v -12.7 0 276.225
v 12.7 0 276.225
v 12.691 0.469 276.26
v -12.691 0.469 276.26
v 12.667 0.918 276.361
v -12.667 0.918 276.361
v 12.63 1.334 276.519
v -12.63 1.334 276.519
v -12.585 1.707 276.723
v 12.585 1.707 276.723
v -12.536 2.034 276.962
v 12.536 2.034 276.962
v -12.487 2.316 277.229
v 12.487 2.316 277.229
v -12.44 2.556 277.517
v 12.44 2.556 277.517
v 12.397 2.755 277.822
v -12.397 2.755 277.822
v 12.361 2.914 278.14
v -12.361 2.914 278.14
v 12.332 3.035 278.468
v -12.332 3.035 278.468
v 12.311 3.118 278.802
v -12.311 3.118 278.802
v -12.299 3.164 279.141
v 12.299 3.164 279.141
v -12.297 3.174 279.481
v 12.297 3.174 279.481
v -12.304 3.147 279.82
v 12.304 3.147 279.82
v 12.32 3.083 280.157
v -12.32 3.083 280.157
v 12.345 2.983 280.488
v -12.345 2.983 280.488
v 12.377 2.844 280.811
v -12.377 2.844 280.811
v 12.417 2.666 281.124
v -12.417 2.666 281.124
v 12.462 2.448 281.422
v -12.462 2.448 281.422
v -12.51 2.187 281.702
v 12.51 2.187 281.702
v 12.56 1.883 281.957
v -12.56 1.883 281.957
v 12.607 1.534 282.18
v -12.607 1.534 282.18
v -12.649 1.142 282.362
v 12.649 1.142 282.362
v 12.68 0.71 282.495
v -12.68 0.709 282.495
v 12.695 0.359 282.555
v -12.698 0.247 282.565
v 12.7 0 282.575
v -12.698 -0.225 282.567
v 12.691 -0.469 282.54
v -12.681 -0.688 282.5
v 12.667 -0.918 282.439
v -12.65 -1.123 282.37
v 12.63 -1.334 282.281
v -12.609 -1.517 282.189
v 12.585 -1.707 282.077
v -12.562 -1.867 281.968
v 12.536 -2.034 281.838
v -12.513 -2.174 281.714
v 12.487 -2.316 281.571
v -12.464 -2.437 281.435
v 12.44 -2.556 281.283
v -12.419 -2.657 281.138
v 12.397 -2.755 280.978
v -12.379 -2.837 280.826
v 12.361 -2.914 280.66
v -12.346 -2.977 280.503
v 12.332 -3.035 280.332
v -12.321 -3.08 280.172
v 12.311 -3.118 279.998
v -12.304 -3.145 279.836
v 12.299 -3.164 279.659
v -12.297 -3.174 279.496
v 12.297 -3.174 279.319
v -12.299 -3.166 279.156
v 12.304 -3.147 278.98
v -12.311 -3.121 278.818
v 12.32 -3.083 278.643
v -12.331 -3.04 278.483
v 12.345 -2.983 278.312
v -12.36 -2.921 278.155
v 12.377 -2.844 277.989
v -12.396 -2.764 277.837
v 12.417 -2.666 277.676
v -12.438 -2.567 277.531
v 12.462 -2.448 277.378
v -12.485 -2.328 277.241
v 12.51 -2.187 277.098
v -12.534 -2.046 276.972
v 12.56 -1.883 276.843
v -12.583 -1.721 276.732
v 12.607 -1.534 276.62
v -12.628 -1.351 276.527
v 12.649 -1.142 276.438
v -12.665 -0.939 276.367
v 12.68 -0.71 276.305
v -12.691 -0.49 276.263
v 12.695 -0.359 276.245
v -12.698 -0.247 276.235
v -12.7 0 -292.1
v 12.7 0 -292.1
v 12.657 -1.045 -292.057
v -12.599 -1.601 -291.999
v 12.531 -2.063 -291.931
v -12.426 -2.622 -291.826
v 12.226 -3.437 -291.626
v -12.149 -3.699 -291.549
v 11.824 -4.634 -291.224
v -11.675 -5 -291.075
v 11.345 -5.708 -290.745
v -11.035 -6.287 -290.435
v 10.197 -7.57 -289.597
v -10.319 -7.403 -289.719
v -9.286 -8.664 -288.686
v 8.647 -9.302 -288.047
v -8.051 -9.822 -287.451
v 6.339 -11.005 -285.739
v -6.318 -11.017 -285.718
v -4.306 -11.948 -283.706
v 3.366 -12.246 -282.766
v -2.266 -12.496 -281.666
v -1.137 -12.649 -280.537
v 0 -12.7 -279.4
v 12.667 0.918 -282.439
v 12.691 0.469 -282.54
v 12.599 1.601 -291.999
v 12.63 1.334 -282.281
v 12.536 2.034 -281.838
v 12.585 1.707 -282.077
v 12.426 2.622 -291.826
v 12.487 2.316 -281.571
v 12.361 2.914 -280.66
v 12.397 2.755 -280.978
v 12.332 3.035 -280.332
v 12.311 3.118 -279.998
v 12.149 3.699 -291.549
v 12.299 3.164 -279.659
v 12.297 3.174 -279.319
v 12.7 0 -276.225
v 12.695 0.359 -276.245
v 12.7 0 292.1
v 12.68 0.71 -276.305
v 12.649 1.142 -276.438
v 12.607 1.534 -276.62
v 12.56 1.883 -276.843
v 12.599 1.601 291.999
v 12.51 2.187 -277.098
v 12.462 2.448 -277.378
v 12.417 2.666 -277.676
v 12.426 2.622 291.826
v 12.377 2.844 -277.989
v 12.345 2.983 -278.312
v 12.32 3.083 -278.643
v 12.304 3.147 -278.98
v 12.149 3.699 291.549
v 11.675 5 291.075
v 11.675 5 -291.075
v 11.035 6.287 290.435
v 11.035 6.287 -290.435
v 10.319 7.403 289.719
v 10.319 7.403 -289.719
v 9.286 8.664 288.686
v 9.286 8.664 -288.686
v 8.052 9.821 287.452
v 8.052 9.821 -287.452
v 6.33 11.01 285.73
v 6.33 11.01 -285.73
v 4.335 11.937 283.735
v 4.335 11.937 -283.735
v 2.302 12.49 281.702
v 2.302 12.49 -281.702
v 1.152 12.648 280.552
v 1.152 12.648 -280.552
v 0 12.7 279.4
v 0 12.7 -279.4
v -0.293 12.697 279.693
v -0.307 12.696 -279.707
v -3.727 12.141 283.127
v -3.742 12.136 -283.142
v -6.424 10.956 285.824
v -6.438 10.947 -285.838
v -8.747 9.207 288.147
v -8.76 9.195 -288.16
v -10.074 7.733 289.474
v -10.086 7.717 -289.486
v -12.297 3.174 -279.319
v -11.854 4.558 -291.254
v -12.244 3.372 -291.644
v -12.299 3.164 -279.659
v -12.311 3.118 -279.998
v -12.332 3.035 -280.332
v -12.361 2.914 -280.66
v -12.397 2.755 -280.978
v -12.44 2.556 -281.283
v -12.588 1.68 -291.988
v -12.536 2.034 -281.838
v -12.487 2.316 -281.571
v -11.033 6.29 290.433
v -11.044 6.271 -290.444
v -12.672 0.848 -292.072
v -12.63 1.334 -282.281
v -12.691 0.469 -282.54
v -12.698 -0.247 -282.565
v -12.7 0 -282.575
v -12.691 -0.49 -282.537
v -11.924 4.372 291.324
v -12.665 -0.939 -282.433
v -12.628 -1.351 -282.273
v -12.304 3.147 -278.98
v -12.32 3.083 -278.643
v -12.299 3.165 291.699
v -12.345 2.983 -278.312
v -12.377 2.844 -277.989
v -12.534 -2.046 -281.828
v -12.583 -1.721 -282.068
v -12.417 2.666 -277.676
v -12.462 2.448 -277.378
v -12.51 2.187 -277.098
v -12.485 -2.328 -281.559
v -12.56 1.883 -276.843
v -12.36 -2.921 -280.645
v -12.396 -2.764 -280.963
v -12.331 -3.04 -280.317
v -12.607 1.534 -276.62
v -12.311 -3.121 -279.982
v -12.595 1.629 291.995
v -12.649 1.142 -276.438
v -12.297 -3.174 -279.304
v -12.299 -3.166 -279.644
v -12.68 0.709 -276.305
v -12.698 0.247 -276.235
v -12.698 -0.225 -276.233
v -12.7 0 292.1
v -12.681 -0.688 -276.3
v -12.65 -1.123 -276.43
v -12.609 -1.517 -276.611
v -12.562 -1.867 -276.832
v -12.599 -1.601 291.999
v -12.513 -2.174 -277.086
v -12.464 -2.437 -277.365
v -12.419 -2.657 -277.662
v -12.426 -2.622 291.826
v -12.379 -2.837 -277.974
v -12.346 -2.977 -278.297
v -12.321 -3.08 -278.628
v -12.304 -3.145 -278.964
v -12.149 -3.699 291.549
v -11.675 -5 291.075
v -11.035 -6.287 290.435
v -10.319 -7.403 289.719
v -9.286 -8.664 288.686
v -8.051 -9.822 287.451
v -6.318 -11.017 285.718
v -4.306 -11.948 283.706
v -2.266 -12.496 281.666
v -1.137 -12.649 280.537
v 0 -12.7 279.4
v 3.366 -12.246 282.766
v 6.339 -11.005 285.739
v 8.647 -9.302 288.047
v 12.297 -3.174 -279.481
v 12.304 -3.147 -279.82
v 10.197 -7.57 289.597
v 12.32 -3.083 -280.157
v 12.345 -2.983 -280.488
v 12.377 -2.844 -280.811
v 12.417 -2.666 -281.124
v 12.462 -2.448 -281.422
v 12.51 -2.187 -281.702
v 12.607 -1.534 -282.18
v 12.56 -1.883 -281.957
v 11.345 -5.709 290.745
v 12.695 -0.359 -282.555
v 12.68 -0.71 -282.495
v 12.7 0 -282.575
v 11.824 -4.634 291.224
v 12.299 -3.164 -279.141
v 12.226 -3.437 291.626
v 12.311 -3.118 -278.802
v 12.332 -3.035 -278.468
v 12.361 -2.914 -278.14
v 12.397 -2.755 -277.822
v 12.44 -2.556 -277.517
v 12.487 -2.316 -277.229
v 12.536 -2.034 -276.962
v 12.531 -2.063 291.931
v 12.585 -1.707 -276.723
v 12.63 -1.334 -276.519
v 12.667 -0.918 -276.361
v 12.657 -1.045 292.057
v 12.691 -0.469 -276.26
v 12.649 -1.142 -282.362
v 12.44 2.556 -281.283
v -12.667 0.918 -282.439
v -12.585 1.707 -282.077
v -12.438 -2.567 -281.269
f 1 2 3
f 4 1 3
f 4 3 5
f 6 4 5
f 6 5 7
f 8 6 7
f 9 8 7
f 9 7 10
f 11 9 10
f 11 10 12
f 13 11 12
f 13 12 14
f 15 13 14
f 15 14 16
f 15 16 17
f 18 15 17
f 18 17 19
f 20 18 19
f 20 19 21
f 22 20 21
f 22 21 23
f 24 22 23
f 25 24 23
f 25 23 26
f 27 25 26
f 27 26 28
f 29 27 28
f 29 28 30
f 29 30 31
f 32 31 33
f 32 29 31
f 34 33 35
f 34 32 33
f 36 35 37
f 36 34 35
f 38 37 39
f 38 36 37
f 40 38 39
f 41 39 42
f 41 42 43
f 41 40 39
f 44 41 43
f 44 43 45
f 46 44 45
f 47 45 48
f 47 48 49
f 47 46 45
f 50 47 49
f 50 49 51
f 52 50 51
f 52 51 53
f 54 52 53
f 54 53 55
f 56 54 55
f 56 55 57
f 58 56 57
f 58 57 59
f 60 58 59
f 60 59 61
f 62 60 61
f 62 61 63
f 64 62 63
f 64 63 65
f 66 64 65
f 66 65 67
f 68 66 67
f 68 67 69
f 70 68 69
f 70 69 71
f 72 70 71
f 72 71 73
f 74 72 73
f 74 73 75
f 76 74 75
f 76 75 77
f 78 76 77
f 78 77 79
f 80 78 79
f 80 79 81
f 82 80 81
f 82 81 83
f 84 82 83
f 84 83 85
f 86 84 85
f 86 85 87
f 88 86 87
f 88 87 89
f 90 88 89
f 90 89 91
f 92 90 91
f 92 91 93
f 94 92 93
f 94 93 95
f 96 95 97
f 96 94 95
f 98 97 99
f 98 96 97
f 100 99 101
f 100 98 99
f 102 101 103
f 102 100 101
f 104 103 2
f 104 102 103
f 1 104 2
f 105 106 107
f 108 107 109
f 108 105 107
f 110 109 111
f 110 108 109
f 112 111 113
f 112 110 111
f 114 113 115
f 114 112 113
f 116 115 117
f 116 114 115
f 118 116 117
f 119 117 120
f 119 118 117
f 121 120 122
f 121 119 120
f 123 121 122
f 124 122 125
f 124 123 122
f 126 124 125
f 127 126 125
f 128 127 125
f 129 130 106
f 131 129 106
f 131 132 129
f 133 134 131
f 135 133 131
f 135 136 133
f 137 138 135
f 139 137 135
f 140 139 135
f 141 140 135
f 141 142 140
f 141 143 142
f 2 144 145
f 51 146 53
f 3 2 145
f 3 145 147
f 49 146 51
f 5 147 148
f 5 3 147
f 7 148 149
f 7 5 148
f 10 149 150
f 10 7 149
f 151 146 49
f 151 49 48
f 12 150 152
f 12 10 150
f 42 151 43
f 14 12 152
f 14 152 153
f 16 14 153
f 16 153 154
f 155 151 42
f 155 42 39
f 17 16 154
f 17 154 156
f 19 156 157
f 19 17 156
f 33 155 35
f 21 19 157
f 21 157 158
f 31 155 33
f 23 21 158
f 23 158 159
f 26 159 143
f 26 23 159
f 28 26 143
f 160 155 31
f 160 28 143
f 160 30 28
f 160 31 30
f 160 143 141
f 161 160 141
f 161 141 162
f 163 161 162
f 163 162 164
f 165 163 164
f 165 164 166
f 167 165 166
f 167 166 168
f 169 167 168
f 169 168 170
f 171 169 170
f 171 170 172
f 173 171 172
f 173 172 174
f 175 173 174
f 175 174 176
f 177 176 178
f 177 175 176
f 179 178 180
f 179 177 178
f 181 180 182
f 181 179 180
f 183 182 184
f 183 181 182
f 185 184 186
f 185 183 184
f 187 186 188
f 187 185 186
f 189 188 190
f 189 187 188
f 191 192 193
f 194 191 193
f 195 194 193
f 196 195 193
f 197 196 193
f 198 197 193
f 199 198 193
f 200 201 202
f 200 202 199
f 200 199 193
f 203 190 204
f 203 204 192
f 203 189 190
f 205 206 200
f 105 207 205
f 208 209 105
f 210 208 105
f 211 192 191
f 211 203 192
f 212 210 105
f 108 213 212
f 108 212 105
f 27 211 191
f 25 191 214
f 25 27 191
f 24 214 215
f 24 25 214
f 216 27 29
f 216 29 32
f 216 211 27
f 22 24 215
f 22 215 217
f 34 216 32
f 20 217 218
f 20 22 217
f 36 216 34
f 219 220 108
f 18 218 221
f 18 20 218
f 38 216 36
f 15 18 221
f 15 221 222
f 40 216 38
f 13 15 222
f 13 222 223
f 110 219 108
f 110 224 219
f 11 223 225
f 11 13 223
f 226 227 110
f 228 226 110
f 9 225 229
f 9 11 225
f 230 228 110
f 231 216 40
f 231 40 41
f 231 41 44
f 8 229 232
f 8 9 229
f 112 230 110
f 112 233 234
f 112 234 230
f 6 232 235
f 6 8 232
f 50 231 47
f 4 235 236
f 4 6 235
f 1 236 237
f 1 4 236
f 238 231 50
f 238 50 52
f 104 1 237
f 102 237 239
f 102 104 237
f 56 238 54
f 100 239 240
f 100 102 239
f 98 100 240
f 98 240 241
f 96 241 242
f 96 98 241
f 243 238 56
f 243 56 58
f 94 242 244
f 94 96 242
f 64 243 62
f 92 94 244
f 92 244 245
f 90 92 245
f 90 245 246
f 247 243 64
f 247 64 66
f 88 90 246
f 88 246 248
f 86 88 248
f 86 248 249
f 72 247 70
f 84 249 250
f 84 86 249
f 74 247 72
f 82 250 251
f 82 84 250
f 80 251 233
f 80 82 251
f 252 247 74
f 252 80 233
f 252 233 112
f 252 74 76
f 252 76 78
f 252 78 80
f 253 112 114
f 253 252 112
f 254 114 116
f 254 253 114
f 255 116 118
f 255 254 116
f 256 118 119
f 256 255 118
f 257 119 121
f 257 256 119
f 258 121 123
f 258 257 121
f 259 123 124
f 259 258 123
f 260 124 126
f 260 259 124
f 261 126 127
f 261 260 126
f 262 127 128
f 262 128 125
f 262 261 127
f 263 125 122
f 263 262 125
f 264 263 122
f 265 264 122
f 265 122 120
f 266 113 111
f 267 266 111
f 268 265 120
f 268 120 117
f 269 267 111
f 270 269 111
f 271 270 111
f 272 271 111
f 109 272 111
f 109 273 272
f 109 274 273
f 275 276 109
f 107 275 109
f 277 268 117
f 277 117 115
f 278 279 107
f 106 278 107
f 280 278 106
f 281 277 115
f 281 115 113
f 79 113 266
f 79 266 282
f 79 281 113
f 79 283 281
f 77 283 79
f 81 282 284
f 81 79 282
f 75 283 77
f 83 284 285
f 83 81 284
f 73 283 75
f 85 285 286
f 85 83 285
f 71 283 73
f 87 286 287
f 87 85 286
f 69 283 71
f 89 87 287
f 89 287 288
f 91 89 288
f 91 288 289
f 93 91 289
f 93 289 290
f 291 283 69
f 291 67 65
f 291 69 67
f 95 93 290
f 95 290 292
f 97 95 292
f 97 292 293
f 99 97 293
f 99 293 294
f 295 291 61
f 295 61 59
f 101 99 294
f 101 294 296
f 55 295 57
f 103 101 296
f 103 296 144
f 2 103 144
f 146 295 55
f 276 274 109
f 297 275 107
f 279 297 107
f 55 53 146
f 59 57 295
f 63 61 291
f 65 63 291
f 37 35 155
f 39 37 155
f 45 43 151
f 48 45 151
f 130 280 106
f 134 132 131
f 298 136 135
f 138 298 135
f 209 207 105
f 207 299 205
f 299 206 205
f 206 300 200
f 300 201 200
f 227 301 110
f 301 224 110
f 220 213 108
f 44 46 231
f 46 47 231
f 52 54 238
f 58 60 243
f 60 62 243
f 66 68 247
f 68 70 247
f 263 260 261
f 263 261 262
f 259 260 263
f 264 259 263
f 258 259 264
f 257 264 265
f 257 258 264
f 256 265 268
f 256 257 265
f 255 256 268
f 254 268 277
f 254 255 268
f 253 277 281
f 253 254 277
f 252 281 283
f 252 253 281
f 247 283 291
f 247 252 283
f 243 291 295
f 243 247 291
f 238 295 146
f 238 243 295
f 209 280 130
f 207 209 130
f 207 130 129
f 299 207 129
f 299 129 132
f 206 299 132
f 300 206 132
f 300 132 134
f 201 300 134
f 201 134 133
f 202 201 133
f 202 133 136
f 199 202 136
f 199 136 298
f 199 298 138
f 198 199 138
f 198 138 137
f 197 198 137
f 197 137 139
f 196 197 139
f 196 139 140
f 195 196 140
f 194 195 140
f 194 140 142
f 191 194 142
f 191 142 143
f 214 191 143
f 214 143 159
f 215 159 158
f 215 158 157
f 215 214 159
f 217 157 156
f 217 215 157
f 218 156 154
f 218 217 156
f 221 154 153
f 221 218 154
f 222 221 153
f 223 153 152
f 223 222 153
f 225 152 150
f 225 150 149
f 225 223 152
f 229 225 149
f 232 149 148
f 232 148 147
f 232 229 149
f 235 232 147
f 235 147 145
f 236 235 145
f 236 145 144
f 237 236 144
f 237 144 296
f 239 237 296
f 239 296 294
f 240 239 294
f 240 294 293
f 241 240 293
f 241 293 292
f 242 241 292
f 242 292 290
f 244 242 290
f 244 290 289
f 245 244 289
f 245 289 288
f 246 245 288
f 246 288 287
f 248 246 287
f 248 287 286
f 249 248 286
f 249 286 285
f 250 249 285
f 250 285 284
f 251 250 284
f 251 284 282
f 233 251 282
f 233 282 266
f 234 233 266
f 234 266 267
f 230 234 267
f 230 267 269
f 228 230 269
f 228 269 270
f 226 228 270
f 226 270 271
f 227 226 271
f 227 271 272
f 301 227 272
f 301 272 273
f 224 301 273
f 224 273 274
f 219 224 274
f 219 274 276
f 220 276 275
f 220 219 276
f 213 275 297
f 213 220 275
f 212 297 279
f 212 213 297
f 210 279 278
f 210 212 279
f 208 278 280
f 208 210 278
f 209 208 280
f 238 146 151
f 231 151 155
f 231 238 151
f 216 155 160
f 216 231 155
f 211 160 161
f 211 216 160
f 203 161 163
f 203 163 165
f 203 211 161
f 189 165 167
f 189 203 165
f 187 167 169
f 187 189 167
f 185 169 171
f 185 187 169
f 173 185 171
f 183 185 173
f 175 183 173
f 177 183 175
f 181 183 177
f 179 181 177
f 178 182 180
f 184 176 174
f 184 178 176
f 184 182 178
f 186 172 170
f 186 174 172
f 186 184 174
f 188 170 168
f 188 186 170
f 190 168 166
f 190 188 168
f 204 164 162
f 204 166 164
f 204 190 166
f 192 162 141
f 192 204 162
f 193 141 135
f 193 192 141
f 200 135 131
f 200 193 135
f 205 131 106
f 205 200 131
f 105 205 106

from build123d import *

# Parameters (mm, degrees)
SKETCH1_R              = 12.7
BOSS_EXTRUDE1_DEPTH    = 292.1
CUT_EXTRUDE2_START     = -12.700000102
CUT_EXTRUDE2_OUTLINE_R = 3.175
CUT_EXTRUDE2_DEPTH     = 25.400000102


# Read off the part's stored shape, not the designer's step: Cut-Extrude2
with BuildPart() as part:
    # Sketch1 → Boss-Extrude1 (new, symmetric)
    with BuildSketch(Plane.XY):
        Circle(SKETCH1_R)
    extrude(amount=BOSS_EXTRUDE1_DEPTH, both=True)

    # Cut-Extrude2 outline → Cut-Extrude2 (cut)
    with BuildSketch(Plane(origin=(0, 0, 0), x_dir=(0, 0, -1), z_dir=(1, 0, 0)).offset(CUT_EXTRUDE2_START)):
        with BuildLine():
            ThreePointArc((-292.1, 3.2e-08), (-288.38025611, 8.980256132), (-279.4, 12.7))
            Line((-279.4, 12.7), (-292.1, 12.7))
            Line((-292.1, 12.7), (-292.1, 3.2e-08))
        make_face()
        with BuildLine():
            Line((292.1, 12.7), (279.4, 12.7))
            ThreePointArc((279.4, 12.7), (288.38025611, 8.980256132), (292.1, 3.2e-08))
            Line((292.1, 3.2e-08), (292.1, 12.7))
        make_face()
        with BuildLine():
            ThreePointArc((-279.4, -12.7), (-288.380256132, -8.98025611), (-292.1, 3.2e-08))
            Line((-292.1, 3.2e-08), (-292.1, -12.7))
            Line((-292.1, -12.7), (-279.4, -12.7))
        make_face()
        with BuildLine():
            Line((292.1, -12.7), (292.1, 3.2e-08))
            ThreePointArc((292.1, 3.2e-08), (288.380256132, -8.98025611), (279.4, -12.7))
            Line((279.4, -12.7), (292.1, -12.7))
        make_face()
        with Locations((-279.4, 0)):
            Circle(CUT_EXTRUDE2_OUTLINE_R)
        with Locations((279.4, 0)):
            Circle(CUT_EXTRUDE2_OUTLINE_R)
    extrude(amount=CUT_EXTRUDE2_DEPTH, mode=Mode.SUBTRACT)


solid = part.part
